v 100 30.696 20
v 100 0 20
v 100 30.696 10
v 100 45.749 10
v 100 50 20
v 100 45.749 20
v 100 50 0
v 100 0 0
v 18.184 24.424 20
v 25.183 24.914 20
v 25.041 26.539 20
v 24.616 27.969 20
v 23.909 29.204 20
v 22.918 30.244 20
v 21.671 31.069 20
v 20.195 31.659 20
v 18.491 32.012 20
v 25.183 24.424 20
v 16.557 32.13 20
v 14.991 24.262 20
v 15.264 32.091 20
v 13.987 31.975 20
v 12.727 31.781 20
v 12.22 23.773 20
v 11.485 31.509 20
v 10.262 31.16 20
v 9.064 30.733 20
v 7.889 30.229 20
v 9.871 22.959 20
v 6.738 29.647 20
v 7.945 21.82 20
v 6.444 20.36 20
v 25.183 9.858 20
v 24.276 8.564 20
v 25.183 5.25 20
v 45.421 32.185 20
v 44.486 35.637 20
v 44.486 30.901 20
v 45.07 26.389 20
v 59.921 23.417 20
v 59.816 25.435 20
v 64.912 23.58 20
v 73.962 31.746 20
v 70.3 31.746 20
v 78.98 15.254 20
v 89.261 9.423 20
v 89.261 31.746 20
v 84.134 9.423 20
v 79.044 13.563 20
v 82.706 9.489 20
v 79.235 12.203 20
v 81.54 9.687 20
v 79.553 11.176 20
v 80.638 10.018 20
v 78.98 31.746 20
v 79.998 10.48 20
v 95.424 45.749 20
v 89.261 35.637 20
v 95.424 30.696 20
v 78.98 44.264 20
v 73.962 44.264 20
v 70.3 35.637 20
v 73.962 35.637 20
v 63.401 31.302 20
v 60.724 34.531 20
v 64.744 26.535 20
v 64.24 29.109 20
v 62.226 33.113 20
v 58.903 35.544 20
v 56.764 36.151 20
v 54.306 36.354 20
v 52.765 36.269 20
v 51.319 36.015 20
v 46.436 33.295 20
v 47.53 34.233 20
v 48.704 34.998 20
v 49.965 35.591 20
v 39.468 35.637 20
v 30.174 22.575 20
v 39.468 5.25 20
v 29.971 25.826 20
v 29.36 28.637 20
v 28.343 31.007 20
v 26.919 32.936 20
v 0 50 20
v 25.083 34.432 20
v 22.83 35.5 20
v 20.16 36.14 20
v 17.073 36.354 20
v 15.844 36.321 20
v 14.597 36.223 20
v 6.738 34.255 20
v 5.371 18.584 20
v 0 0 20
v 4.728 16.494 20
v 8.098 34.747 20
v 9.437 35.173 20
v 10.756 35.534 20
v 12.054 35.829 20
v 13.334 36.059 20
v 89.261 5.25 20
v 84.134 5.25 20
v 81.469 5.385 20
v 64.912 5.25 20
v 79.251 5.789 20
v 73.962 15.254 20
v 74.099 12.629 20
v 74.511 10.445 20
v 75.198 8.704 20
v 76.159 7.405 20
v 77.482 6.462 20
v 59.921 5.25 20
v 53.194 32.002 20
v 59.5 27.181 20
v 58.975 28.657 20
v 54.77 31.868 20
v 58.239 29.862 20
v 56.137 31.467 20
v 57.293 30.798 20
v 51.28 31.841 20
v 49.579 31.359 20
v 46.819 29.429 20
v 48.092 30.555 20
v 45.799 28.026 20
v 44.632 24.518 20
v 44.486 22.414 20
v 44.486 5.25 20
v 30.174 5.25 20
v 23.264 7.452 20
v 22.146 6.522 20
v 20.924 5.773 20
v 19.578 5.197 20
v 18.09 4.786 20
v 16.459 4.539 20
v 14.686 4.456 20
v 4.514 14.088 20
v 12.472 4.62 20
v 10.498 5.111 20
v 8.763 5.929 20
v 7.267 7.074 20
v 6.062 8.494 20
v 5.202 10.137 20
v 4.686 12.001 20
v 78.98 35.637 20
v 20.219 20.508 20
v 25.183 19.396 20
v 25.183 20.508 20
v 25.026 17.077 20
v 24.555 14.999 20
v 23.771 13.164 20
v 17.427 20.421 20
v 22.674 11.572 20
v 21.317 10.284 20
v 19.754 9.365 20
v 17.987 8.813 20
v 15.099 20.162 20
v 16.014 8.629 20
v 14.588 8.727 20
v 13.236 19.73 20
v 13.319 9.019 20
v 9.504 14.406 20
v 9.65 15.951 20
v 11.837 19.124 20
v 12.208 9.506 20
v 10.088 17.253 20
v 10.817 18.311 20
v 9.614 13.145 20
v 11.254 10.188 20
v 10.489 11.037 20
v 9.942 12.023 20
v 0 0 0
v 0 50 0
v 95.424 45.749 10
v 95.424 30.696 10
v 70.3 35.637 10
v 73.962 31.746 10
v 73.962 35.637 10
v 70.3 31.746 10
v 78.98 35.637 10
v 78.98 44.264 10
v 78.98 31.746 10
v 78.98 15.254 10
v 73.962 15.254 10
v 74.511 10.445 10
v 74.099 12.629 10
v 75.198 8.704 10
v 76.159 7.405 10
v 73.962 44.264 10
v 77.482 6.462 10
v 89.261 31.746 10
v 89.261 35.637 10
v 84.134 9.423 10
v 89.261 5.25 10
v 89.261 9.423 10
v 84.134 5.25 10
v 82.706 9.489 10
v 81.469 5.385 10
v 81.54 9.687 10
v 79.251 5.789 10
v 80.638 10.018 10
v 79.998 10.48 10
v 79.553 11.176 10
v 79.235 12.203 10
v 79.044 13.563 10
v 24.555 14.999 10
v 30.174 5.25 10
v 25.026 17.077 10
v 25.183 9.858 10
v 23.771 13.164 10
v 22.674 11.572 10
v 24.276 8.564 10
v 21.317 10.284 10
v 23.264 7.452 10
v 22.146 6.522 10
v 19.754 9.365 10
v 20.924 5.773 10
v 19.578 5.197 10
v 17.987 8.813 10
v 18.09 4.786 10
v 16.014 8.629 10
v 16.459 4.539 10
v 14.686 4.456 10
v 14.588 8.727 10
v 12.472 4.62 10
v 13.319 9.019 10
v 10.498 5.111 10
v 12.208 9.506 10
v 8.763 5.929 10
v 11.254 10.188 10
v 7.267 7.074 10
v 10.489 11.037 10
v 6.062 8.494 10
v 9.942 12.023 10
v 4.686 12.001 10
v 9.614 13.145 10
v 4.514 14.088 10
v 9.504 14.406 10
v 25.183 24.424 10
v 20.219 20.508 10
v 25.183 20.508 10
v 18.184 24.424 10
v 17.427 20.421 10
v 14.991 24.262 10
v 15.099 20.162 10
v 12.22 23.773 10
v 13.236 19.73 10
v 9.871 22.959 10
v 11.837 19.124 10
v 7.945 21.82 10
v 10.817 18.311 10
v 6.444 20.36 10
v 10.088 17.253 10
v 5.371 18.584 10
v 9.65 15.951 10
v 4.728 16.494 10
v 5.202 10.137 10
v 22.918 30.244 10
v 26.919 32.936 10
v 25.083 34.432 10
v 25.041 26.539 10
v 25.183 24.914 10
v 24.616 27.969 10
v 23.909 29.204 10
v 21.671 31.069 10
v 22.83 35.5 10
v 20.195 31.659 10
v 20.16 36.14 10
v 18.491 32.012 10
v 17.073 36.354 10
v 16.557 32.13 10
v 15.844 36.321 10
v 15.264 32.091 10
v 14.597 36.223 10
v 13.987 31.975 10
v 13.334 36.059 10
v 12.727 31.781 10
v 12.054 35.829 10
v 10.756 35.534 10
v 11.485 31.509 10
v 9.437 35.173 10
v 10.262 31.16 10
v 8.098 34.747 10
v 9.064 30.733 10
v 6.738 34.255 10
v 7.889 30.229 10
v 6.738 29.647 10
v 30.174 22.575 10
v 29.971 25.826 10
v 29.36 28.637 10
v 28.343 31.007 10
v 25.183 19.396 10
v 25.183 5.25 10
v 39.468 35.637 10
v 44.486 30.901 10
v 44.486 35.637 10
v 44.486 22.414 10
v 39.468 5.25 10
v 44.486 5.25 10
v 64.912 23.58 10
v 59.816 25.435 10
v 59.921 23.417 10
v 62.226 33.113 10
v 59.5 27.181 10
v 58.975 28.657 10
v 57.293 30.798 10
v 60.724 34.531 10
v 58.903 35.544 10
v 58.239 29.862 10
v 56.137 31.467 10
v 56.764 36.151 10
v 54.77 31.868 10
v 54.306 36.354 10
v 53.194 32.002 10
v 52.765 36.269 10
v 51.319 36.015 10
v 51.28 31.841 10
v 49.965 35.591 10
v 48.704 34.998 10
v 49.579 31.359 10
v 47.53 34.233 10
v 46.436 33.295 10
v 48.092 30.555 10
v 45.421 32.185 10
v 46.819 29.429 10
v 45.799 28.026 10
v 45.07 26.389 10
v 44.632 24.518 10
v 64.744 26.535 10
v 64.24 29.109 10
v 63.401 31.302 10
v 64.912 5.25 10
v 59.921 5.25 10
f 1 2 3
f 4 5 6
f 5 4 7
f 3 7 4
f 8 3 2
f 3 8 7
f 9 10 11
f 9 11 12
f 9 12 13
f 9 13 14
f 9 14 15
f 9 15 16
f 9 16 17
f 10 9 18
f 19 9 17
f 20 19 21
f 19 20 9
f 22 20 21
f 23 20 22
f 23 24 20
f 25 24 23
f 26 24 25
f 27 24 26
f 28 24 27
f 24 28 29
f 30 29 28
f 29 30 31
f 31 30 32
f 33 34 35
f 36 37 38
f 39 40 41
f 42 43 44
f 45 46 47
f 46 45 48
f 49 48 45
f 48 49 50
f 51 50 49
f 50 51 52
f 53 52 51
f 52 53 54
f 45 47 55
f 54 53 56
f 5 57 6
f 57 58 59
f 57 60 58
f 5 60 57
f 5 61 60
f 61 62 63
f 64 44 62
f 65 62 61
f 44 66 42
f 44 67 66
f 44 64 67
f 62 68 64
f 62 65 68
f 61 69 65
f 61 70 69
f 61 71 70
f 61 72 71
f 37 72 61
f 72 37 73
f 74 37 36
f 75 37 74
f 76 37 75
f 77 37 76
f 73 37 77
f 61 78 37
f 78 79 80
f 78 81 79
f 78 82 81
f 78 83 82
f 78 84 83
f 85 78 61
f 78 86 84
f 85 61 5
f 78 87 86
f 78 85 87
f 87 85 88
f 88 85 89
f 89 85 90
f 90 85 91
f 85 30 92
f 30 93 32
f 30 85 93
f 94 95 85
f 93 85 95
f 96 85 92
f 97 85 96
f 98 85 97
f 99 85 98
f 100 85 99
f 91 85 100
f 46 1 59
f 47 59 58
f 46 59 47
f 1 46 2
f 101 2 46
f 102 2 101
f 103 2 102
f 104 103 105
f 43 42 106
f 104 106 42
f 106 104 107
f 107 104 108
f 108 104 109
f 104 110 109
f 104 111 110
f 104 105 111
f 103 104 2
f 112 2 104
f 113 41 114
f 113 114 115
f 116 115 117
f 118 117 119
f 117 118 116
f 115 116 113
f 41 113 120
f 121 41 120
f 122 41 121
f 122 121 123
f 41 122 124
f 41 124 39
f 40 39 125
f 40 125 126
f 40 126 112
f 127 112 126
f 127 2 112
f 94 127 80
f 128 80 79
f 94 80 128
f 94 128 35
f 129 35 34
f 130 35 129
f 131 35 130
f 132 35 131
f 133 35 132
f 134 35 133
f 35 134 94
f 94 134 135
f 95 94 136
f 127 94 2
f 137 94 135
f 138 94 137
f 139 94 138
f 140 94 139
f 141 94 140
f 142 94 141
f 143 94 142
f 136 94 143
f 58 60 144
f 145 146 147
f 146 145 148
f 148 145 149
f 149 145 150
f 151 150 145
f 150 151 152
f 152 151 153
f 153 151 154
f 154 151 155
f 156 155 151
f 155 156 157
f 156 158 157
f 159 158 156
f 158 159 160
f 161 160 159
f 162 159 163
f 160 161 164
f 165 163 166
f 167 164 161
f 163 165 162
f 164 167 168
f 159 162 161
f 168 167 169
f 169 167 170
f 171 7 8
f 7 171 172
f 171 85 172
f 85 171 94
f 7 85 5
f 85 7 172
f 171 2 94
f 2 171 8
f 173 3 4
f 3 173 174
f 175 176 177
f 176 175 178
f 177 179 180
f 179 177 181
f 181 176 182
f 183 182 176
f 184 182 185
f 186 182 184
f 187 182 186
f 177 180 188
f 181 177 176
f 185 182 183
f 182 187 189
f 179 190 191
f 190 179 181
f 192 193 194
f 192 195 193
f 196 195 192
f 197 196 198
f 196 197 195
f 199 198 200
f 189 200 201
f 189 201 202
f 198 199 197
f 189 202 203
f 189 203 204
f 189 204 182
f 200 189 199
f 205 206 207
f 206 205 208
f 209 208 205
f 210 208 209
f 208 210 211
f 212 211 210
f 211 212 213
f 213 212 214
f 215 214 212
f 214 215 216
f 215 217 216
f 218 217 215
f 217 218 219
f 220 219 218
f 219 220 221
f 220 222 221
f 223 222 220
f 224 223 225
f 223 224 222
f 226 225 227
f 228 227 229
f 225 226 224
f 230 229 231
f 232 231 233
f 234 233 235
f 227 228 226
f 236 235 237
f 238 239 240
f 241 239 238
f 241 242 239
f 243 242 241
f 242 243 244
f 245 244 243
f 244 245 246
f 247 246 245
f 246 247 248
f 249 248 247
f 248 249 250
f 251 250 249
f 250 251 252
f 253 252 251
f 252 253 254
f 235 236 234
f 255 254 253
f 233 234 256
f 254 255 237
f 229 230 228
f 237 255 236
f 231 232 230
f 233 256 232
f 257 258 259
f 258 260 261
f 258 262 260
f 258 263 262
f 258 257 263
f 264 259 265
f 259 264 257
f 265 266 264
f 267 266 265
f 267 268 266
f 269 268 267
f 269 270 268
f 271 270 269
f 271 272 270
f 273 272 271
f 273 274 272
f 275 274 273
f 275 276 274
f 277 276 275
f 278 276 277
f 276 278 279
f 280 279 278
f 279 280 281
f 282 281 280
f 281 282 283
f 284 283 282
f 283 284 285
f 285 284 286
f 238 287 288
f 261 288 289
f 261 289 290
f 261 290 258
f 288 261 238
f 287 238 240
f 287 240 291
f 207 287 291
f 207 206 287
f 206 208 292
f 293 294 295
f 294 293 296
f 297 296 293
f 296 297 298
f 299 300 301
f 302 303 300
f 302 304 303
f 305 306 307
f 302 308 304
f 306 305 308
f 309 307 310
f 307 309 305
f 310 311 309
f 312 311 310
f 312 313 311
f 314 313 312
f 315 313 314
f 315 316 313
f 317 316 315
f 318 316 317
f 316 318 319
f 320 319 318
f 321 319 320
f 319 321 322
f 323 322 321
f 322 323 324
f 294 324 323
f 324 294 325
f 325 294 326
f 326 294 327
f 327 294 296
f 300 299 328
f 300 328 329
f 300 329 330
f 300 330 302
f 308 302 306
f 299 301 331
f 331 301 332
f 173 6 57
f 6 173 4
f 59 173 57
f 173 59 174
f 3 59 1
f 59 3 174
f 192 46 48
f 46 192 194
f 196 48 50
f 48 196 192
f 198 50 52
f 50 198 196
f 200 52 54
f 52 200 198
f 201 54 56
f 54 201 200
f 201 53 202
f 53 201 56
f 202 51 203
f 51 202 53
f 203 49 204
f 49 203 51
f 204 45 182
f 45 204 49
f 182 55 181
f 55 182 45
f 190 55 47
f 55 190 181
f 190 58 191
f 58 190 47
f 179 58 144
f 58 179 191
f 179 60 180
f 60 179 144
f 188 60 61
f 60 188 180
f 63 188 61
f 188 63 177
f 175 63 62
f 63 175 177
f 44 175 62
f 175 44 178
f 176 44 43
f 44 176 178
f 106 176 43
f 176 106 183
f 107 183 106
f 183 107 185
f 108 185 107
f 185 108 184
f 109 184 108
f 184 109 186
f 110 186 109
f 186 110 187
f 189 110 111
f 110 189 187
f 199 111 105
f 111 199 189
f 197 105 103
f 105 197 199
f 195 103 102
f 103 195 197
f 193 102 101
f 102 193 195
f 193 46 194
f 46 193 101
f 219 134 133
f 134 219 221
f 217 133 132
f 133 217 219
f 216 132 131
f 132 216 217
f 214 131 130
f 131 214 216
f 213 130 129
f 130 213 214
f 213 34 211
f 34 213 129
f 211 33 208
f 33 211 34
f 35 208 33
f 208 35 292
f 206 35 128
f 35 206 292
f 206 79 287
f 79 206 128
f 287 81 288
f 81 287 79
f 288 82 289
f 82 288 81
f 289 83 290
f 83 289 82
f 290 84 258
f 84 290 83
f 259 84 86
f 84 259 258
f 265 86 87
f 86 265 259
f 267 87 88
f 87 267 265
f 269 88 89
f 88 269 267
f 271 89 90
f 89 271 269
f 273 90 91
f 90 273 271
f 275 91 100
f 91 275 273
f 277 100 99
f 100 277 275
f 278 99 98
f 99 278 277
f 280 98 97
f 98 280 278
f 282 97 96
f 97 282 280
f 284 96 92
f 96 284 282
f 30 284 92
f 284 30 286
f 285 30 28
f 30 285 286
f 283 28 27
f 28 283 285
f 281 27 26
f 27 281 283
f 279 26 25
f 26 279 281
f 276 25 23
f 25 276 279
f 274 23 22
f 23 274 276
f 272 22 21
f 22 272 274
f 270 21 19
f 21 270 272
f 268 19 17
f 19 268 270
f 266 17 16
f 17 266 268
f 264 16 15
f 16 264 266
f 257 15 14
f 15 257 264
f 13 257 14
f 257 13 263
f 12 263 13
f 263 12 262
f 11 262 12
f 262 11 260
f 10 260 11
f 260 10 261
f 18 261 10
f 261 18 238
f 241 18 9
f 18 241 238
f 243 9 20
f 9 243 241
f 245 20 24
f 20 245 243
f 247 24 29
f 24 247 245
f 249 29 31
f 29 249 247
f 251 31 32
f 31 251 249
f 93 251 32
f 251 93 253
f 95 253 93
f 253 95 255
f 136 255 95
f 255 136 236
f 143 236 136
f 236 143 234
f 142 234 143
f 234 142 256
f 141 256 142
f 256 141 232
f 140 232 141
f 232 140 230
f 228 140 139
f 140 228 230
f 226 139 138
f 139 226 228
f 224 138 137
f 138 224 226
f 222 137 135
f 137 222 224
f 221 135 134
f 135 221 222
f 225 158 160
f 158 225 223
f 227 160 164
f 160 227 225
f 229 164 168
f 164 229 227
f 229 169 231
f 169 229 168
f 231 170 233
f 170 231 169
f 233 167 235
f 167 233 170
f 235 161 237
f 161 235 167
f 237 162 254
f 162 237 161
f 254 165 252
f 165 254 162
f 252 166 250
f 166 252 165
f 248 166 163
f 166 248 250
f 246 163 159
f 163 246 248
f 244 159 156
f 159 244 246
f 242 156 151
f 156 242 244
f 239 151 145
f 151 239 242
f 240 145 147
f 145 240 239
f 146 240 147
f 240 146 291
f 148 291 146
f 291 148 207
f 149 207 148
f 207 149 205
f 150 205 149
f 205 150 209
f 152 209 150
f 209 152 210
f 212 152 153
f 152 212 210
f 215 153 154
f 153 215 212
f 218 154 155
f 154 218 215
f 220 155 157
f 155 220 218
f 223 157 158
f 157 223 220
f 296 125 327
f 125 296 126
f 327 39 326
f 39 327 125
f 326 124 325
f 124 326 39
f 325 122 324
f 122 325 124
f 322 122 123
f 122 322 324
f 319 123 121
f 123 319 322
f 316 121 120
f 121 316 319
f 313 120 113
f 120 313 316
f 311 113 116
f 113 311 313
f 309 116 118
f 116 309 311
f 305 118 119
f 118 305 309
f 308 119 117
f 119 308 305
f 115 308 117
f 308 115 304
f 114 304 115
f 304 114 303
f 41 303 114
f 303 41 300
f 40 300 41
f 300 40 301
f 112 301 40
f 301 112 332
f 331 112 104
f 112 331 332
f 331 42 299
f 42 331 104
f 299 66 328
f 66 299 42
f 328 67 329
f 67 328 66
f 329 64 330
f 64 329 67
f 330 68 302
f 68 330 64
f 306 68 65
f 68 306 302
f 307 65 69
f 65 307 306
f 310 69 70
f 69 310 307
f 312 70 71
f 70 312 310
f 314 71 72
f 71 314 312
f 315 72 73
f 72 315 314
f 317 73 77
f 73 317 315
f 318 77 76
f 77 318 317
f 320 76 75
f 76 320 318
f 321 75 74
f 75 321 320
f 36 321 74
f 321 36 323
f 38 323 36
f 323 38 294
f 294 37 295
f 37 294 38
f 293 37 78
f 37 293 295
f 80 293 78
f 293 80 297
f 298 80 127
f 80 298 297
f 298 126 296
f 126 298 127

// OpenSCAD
logo_text = "Sant's";
logo_height = 10;
font_name = "Poiret One";
recess_depth = 10;
block_thickness = recess_depth + logo_height;
block_width = 100; // Adjust as needed
block_height = 50; // Adjust as needed

module logo() {
    linear_extrude(height = logo_height)
    text(logo_text, font = str("font name = ", font_name, ";"), size = block_height * 0.8, halign = "center", valign = "center");
}

difference() {
    cube([block_width, block_height, block_thickness]);
    translate([block_width / 2, block_height / 2, recess_depth])
    logo();
}
